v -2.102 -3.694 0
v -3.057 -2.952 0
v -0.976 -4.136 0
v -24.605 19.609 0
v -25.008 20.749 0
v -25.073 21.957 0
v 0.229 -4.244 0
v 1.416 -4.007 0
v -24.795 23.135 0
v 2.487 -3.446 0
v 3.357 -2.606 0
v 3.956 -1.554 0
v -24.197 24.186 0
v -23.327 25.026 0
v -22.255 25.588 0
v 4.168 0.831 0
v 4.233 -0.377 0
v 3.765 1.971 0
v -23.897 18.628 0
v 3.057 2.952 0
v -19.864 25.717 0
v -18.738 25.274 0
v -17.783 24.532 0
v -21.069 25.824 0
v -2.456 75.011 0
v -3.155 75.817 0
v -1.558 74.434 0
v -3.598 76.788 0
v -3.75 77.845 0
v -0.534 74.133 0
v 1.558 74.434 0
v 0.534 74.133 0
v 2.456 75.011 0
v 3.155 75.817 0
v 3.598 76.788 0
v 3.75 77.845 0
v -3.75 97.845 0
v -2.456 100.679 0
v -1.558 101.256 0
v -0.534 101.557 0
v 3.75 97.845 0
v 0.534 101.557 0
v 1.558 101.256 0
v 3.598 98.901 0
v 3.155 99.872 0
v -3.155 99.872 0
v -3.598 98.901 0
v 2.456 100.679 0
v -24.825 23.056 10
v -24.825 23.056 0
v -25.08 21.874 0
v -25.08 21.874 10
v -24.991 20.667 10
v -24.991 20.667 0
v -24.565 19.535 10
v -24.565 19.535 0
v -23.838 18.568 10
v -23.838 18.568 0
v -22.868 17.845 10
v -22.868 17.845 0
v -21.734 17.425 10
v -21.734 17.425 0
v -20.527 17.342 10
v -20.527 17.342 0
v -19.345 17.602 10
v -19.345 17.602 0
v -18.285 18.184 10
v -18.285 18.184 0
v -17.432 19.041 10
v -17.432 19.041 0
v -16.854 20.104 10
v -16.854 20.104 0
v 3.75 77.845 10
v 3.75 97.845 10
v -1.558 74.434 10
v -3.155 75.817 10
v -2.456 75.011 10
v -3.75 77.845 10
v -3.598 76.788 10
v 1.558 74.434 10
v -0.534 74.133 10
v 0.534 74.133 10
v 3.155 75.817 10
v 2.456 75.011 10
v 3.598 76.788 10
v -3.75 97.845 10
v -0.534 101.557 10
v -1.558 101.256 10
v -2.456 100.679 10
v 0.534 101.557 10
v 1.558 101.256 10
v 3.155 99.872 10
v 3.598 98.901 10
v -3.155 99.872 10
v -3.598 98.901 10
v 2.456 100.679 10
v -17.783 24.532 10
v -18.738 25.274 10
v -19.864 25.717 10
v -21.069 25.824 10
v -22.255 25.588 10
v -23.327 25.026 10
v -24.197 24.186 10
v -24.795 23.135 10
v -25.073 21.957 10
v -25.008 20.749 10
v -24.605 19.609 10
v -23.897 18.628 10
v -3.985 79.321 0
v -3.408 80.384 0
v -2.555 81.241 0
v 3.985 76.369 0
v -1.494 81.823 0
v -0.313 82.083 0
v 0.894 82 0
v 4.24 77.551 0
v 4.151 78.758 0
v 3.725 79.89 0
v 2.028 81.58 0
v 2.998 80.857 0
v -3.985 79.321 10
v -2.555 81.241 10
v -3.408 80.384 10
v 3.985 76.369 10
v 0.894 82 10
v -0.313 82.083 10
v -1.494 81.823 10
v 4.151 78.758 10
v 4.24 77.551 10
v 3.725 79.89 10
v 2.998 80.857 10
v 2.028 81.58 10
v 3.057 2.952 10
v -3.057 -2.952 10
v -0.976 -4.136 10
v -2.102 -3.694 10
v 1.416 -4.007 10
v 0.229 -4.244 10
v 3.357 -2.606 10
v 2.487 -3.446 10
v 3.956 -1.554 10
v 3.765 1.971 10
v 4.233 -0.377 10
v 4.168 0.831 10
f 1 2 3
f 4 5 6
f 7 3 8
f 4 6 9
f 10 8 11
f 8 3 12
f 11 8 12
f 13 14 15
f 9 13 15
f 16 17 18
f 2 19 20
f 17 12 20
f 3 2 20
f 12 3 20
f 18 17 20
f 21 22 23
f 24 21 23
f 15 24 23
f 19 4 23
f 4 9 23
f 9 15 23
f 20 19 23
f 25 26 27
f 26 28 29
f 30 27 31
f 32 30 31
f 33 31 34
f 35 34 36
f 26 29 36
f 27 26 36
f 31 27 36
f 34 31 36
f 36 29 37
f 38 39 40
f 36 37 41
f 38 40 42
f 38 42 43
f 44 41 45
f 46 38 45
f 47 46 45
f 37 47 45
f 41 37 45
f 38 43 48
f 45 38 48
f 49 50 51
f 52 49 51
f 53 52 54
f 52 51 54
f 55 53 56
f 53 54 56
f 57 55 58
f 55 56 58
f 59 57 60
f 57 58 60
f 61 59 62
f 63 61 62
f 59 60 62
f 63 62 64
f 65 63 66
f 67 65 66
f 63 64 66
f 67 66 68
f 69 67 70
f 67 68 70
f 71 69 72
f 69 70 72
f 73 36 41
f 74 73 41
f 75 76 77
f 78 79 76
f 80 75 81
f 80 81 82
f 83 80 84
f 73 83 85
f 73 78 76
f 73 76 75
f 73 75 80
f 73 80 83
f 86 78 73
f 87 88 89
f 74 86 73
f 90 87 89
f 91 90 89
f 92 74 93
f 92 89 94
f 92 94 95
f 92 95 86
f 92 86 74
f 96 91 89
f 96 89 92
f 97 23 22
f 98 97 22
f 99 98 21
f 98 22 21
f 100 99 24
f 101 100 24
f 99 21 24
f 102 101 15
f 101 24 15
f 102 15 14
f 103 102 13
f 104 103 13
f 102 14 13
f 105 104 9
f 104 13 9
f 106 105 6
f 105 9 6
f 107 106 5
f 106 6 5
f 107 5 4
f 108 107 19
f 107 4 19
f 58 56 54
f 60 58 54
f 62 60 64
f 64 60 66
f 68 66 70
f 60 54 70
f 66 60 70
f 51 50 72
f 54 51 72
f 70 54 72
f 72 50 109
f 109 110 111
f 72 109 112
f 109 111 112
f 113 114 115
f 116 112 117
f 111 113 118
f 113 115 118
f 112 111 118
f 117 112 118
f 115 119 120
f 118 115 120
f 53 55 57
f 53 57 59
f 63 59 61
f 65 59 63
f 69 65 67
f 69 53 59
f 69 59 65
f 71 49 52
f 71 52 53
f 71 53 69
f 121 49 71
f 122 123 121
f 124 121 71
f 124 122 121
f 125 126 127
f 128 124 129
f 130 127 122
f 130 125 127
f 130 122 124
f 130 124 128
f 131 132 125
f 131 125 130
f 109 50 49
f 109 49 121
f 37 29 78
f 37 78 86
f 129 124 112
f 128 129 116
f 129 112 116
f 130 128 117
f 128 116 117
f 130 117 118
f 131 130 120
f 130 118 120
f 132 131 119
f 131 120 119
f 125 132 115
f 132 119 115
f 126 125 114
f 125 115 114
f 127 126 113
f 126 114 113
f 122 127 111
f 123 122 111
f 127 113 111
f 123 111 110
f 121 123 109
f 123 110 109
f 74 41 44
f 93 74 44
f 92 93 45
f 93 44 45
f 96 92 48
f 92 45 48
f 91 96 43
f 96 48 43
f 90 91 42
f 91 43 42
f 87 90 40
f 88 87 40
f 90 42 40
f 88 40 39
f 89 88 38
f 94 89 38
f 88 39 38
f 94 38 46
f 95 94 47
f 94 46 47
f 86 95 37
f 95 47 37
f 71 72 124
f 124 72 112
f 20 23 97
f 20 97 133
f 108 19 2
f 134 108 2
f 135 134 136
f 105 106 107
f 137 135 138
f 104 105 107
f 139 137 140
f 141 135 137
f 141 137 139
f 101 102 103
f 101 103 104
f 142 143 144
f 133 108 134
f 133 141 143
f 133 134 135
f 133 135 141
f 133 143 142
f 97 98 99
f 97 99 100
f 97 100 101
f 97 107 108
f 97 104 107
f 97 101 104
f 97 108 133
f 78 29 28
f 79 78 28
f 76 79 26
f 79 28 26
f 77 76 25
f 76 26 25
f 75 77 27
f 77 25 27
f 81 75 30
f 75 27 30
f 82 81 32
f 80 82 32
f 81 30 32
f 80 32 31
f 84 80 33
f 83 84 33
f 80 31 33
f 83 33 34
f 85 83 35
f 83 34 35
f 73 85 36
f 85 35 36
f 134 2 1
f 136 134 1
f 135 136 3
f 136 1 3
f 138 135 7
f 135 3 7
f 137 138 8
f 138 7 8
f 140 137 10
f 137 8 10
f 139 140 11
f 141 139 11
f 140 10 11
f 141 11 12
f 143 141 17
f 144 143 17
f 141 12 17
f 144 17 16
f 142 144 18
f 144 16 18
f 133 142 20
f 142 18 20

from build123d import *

# Parameters (mm, degrees)
PAD_DEPTH    = 10
PAD001_DEPTH = 10
PAD002_DEPTH = 10


with BuildPart() as cam:
    # Sketch001 → Pad (new body)
    with BuildSketch(Plane.XY):
        with BuildLine():
            ThreePointArc((-17.782557, 24.532492), (-23.792049, 24.637388), (-23.896945, 18.627896))
            Line((-23.896945, 18.627896), (-3.057194, -2.952298))
            ThreePointArc((-3.057194, -2.952298), (2.952298, -3.057194), (3.057194, 2.952298))
            Line((-17.782557, 24.532492), (3.057194, 2.952298))
        make_face()
    extrude(amount=PAD_DEPTH)


with BuildPart() as rod:
    # Sketch002 → Pad001 (new body)
    with BuildSketch(Plane.XY):
        with BuildLine():
            ThreePointArc((-24.82516, 23.056343), (-22.3159, 17.594785), (-16.854342, 20.104045))
            Line((-16.854342, 20.104045), (3.985409, 76.368641))
            ThreePointArc((3.985409, 76.368641), (1.476149, 81.830199), (-3.985409, 79.320939))
            Line((-24.82516, 23.056343), (-3.985409, 79.320939))
        make_face()
    extrude(amount=PAD001_DEPTH)


with BuildPart() as link:
    # Sketch003 → Pad002 (new body)
    with BuildSketch(Plane.XY):
        with BuildLine():
            ThreePointArc((-3.75, 77.84479), (0, 74.09479), (3.75, 77.84479))
            Line((3.75, 77.84479), (3.75, 97.84479))
            ThreePointArc((3.75, 97.84479), (0, 101.59479), (-3.75, 97.84479))
            Line((-3.75, 77.84479), (-3.75, 97.84479))
        make_face()
    extrude(amount=PAD002_DEPTH)


solid = Compound([cam.part, rod.part, link.part])
